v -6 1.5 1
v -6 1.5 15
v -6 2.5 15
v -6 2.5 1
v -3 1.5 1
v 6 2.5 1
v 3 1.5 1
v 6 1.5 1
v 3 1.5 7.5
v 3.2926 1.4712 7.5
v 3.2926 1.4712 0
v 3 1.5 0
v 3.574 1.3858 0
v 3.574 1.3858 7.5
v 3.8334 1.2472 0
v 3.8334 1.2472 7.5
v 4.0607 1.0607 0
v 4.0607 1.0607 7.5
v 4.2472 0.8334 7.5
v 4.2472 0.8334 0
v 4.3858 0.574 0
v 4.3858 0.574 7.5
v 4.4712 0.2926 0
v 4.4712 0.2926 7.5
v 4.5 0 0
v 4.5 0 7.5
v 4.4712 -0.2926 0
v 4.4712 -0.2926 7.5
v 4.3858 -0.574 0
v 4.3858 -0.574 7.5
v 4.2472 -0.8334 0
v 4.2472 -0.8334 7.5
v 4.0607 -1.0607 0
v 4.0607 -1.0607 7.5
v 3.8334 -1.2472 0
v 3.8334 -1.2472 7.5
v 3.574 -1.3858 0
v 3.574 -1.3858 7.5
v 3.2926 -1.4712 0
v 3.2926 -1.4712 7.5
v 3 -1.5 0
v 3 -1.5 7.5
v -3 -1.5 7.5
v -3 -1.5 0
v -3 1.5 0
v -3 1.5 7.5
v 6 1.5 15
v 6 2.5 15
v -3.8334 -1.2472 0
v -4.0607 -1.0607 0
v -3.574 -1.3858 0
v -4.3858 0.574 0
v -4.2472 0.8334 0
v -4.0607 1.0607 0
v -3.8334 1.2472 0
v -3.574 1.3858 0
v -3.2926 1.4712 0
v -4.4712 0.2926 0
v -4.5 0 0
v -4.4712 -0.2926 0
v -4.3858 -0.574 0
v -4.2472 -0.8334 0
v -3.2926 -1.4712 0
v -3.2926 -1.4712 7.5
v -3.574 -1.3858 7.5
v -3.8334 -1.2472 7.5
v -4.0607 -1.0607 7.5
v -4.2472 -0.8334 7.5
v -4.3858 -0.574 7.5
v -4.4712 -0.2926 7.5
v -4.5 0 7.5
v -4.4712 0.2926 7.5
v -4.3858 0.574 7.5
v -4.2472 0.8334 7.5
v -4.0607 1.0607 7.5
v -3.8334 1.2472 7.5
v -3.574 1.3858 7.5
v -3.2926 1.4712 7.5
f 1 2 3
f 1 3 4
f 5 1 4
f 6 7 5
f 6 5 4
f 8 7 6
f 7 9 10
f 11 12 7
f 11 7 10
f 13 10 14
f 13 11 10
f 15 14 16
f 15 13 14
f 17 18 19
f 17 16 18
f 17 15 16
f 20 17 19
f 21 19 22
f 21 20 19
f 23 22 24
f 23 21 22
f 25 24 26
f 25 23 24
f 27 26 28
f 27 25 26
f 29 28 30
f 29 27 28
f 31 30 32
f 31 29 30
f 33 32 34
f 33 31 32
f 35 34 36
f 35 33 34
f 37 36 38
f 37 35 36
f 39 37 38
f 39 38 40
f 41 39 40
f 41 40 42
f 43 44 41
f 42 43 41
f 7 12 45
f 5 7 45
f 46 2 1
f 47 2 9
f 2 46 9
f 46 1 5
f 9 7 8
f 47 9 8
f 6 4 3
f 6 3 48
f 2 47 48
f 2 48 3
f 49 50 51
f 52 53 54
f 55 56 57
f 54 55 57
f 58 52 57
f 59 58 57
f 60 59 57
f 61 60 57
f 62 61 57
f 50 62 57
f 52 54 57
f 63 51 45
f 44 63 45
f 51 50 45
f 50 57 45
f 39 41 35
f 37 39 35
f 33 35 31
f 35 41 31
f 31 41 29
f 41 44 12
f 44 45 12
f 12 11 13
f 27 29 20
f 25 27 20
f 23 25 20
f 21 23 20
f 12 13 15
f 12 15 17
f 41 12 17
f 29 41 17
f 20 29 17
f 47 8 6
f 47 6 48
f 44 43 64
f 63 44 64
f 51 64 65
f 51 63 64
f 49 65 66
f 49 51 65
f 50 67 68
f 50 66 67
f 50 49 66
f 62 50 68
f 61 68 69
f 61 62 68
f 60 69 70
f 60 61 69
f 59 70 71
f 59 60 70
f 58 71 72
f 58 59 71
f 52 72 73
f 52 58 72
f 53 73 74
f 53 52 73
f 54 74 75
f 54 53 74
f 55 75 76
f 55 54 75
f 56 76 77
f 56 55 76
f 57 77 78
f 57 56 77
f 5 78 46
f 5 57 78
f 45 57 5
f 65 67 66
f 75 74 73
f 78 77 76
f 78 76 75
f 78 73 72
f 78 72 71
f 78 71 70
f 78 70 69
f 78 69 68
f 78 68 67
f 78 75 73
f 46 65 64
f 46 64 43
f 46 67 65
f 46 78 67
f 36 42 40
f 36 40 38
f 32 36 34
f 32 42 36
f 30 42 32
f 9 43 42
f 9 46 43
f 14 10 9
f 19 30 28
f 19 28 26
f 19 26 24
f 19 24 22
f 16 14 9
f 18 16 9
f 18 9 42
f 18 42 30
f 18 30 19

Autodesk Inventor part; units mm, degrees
ref_plane "YZ Plane" through (0, 0, 0) normal (1, 0, 0) x (0, 1, 0)
ref_plane "XZ Plane" through (0, 0, 0) normal (0, 1, 0) x (-1, 0, 0)
ref_plane "XY Plane" through (0, 0, 0) normal (0, 0, 1) x (1, 0, 0)
sketch "Sketch1" plane through (0, 0, 0) normal (0, 0, 1) x (1, 0, 0)
  line L0 (-3, 0) -> (3, 0) construction
  line L1 (-3, -1.5) -> (3, -1.5)
  line L2 (3, 1.5) -> (-3, 1.5)
  arc A0 (-3, 1.5) -> (-3, -1.5) centre (-3, 0) ccw
  arc A1 (3, -1.5) -> (3, 1.5) centre (3, 0) ccw
  point P0 (0, 0)
  point P1 (4.5, 0)
  point P2 (-4.5, 0)
  dimension "d0" = 3
  dimension "d1" = 9
extrude "Extrusion1" add sketch "Sketch1" along normal blind 7.5
sketch "Sketch2" plane through (-3, 1.5, 0) normal (0, 1, 0) x (1, 0, 0)
  line L0 (6, 0) -> (0, 0) construction
  line L1 (9, -15) -> (-3, -15)
  line L2 (-3, -15) -> (-3, -1)
  line L3 (-3, -1) -> (9, -1)
  line L4 (9, -1) -> (9, -15)
  line L5 (9, -15) -> (-3, -1) construction
  line L6 (-3, -15) -> (9, -1) construction
  point P0 (3, 0)
  point P1 (3, -8)
  point P2 (3, 0)
  dimension "d4" = 1
  dimension "d5" = 12
  dimension "d6" = 14
extrude "Extrusion2" add sketch "Sketch2" along normal blind 1
properties part number "usb" material "Acetal Resin, Black"
